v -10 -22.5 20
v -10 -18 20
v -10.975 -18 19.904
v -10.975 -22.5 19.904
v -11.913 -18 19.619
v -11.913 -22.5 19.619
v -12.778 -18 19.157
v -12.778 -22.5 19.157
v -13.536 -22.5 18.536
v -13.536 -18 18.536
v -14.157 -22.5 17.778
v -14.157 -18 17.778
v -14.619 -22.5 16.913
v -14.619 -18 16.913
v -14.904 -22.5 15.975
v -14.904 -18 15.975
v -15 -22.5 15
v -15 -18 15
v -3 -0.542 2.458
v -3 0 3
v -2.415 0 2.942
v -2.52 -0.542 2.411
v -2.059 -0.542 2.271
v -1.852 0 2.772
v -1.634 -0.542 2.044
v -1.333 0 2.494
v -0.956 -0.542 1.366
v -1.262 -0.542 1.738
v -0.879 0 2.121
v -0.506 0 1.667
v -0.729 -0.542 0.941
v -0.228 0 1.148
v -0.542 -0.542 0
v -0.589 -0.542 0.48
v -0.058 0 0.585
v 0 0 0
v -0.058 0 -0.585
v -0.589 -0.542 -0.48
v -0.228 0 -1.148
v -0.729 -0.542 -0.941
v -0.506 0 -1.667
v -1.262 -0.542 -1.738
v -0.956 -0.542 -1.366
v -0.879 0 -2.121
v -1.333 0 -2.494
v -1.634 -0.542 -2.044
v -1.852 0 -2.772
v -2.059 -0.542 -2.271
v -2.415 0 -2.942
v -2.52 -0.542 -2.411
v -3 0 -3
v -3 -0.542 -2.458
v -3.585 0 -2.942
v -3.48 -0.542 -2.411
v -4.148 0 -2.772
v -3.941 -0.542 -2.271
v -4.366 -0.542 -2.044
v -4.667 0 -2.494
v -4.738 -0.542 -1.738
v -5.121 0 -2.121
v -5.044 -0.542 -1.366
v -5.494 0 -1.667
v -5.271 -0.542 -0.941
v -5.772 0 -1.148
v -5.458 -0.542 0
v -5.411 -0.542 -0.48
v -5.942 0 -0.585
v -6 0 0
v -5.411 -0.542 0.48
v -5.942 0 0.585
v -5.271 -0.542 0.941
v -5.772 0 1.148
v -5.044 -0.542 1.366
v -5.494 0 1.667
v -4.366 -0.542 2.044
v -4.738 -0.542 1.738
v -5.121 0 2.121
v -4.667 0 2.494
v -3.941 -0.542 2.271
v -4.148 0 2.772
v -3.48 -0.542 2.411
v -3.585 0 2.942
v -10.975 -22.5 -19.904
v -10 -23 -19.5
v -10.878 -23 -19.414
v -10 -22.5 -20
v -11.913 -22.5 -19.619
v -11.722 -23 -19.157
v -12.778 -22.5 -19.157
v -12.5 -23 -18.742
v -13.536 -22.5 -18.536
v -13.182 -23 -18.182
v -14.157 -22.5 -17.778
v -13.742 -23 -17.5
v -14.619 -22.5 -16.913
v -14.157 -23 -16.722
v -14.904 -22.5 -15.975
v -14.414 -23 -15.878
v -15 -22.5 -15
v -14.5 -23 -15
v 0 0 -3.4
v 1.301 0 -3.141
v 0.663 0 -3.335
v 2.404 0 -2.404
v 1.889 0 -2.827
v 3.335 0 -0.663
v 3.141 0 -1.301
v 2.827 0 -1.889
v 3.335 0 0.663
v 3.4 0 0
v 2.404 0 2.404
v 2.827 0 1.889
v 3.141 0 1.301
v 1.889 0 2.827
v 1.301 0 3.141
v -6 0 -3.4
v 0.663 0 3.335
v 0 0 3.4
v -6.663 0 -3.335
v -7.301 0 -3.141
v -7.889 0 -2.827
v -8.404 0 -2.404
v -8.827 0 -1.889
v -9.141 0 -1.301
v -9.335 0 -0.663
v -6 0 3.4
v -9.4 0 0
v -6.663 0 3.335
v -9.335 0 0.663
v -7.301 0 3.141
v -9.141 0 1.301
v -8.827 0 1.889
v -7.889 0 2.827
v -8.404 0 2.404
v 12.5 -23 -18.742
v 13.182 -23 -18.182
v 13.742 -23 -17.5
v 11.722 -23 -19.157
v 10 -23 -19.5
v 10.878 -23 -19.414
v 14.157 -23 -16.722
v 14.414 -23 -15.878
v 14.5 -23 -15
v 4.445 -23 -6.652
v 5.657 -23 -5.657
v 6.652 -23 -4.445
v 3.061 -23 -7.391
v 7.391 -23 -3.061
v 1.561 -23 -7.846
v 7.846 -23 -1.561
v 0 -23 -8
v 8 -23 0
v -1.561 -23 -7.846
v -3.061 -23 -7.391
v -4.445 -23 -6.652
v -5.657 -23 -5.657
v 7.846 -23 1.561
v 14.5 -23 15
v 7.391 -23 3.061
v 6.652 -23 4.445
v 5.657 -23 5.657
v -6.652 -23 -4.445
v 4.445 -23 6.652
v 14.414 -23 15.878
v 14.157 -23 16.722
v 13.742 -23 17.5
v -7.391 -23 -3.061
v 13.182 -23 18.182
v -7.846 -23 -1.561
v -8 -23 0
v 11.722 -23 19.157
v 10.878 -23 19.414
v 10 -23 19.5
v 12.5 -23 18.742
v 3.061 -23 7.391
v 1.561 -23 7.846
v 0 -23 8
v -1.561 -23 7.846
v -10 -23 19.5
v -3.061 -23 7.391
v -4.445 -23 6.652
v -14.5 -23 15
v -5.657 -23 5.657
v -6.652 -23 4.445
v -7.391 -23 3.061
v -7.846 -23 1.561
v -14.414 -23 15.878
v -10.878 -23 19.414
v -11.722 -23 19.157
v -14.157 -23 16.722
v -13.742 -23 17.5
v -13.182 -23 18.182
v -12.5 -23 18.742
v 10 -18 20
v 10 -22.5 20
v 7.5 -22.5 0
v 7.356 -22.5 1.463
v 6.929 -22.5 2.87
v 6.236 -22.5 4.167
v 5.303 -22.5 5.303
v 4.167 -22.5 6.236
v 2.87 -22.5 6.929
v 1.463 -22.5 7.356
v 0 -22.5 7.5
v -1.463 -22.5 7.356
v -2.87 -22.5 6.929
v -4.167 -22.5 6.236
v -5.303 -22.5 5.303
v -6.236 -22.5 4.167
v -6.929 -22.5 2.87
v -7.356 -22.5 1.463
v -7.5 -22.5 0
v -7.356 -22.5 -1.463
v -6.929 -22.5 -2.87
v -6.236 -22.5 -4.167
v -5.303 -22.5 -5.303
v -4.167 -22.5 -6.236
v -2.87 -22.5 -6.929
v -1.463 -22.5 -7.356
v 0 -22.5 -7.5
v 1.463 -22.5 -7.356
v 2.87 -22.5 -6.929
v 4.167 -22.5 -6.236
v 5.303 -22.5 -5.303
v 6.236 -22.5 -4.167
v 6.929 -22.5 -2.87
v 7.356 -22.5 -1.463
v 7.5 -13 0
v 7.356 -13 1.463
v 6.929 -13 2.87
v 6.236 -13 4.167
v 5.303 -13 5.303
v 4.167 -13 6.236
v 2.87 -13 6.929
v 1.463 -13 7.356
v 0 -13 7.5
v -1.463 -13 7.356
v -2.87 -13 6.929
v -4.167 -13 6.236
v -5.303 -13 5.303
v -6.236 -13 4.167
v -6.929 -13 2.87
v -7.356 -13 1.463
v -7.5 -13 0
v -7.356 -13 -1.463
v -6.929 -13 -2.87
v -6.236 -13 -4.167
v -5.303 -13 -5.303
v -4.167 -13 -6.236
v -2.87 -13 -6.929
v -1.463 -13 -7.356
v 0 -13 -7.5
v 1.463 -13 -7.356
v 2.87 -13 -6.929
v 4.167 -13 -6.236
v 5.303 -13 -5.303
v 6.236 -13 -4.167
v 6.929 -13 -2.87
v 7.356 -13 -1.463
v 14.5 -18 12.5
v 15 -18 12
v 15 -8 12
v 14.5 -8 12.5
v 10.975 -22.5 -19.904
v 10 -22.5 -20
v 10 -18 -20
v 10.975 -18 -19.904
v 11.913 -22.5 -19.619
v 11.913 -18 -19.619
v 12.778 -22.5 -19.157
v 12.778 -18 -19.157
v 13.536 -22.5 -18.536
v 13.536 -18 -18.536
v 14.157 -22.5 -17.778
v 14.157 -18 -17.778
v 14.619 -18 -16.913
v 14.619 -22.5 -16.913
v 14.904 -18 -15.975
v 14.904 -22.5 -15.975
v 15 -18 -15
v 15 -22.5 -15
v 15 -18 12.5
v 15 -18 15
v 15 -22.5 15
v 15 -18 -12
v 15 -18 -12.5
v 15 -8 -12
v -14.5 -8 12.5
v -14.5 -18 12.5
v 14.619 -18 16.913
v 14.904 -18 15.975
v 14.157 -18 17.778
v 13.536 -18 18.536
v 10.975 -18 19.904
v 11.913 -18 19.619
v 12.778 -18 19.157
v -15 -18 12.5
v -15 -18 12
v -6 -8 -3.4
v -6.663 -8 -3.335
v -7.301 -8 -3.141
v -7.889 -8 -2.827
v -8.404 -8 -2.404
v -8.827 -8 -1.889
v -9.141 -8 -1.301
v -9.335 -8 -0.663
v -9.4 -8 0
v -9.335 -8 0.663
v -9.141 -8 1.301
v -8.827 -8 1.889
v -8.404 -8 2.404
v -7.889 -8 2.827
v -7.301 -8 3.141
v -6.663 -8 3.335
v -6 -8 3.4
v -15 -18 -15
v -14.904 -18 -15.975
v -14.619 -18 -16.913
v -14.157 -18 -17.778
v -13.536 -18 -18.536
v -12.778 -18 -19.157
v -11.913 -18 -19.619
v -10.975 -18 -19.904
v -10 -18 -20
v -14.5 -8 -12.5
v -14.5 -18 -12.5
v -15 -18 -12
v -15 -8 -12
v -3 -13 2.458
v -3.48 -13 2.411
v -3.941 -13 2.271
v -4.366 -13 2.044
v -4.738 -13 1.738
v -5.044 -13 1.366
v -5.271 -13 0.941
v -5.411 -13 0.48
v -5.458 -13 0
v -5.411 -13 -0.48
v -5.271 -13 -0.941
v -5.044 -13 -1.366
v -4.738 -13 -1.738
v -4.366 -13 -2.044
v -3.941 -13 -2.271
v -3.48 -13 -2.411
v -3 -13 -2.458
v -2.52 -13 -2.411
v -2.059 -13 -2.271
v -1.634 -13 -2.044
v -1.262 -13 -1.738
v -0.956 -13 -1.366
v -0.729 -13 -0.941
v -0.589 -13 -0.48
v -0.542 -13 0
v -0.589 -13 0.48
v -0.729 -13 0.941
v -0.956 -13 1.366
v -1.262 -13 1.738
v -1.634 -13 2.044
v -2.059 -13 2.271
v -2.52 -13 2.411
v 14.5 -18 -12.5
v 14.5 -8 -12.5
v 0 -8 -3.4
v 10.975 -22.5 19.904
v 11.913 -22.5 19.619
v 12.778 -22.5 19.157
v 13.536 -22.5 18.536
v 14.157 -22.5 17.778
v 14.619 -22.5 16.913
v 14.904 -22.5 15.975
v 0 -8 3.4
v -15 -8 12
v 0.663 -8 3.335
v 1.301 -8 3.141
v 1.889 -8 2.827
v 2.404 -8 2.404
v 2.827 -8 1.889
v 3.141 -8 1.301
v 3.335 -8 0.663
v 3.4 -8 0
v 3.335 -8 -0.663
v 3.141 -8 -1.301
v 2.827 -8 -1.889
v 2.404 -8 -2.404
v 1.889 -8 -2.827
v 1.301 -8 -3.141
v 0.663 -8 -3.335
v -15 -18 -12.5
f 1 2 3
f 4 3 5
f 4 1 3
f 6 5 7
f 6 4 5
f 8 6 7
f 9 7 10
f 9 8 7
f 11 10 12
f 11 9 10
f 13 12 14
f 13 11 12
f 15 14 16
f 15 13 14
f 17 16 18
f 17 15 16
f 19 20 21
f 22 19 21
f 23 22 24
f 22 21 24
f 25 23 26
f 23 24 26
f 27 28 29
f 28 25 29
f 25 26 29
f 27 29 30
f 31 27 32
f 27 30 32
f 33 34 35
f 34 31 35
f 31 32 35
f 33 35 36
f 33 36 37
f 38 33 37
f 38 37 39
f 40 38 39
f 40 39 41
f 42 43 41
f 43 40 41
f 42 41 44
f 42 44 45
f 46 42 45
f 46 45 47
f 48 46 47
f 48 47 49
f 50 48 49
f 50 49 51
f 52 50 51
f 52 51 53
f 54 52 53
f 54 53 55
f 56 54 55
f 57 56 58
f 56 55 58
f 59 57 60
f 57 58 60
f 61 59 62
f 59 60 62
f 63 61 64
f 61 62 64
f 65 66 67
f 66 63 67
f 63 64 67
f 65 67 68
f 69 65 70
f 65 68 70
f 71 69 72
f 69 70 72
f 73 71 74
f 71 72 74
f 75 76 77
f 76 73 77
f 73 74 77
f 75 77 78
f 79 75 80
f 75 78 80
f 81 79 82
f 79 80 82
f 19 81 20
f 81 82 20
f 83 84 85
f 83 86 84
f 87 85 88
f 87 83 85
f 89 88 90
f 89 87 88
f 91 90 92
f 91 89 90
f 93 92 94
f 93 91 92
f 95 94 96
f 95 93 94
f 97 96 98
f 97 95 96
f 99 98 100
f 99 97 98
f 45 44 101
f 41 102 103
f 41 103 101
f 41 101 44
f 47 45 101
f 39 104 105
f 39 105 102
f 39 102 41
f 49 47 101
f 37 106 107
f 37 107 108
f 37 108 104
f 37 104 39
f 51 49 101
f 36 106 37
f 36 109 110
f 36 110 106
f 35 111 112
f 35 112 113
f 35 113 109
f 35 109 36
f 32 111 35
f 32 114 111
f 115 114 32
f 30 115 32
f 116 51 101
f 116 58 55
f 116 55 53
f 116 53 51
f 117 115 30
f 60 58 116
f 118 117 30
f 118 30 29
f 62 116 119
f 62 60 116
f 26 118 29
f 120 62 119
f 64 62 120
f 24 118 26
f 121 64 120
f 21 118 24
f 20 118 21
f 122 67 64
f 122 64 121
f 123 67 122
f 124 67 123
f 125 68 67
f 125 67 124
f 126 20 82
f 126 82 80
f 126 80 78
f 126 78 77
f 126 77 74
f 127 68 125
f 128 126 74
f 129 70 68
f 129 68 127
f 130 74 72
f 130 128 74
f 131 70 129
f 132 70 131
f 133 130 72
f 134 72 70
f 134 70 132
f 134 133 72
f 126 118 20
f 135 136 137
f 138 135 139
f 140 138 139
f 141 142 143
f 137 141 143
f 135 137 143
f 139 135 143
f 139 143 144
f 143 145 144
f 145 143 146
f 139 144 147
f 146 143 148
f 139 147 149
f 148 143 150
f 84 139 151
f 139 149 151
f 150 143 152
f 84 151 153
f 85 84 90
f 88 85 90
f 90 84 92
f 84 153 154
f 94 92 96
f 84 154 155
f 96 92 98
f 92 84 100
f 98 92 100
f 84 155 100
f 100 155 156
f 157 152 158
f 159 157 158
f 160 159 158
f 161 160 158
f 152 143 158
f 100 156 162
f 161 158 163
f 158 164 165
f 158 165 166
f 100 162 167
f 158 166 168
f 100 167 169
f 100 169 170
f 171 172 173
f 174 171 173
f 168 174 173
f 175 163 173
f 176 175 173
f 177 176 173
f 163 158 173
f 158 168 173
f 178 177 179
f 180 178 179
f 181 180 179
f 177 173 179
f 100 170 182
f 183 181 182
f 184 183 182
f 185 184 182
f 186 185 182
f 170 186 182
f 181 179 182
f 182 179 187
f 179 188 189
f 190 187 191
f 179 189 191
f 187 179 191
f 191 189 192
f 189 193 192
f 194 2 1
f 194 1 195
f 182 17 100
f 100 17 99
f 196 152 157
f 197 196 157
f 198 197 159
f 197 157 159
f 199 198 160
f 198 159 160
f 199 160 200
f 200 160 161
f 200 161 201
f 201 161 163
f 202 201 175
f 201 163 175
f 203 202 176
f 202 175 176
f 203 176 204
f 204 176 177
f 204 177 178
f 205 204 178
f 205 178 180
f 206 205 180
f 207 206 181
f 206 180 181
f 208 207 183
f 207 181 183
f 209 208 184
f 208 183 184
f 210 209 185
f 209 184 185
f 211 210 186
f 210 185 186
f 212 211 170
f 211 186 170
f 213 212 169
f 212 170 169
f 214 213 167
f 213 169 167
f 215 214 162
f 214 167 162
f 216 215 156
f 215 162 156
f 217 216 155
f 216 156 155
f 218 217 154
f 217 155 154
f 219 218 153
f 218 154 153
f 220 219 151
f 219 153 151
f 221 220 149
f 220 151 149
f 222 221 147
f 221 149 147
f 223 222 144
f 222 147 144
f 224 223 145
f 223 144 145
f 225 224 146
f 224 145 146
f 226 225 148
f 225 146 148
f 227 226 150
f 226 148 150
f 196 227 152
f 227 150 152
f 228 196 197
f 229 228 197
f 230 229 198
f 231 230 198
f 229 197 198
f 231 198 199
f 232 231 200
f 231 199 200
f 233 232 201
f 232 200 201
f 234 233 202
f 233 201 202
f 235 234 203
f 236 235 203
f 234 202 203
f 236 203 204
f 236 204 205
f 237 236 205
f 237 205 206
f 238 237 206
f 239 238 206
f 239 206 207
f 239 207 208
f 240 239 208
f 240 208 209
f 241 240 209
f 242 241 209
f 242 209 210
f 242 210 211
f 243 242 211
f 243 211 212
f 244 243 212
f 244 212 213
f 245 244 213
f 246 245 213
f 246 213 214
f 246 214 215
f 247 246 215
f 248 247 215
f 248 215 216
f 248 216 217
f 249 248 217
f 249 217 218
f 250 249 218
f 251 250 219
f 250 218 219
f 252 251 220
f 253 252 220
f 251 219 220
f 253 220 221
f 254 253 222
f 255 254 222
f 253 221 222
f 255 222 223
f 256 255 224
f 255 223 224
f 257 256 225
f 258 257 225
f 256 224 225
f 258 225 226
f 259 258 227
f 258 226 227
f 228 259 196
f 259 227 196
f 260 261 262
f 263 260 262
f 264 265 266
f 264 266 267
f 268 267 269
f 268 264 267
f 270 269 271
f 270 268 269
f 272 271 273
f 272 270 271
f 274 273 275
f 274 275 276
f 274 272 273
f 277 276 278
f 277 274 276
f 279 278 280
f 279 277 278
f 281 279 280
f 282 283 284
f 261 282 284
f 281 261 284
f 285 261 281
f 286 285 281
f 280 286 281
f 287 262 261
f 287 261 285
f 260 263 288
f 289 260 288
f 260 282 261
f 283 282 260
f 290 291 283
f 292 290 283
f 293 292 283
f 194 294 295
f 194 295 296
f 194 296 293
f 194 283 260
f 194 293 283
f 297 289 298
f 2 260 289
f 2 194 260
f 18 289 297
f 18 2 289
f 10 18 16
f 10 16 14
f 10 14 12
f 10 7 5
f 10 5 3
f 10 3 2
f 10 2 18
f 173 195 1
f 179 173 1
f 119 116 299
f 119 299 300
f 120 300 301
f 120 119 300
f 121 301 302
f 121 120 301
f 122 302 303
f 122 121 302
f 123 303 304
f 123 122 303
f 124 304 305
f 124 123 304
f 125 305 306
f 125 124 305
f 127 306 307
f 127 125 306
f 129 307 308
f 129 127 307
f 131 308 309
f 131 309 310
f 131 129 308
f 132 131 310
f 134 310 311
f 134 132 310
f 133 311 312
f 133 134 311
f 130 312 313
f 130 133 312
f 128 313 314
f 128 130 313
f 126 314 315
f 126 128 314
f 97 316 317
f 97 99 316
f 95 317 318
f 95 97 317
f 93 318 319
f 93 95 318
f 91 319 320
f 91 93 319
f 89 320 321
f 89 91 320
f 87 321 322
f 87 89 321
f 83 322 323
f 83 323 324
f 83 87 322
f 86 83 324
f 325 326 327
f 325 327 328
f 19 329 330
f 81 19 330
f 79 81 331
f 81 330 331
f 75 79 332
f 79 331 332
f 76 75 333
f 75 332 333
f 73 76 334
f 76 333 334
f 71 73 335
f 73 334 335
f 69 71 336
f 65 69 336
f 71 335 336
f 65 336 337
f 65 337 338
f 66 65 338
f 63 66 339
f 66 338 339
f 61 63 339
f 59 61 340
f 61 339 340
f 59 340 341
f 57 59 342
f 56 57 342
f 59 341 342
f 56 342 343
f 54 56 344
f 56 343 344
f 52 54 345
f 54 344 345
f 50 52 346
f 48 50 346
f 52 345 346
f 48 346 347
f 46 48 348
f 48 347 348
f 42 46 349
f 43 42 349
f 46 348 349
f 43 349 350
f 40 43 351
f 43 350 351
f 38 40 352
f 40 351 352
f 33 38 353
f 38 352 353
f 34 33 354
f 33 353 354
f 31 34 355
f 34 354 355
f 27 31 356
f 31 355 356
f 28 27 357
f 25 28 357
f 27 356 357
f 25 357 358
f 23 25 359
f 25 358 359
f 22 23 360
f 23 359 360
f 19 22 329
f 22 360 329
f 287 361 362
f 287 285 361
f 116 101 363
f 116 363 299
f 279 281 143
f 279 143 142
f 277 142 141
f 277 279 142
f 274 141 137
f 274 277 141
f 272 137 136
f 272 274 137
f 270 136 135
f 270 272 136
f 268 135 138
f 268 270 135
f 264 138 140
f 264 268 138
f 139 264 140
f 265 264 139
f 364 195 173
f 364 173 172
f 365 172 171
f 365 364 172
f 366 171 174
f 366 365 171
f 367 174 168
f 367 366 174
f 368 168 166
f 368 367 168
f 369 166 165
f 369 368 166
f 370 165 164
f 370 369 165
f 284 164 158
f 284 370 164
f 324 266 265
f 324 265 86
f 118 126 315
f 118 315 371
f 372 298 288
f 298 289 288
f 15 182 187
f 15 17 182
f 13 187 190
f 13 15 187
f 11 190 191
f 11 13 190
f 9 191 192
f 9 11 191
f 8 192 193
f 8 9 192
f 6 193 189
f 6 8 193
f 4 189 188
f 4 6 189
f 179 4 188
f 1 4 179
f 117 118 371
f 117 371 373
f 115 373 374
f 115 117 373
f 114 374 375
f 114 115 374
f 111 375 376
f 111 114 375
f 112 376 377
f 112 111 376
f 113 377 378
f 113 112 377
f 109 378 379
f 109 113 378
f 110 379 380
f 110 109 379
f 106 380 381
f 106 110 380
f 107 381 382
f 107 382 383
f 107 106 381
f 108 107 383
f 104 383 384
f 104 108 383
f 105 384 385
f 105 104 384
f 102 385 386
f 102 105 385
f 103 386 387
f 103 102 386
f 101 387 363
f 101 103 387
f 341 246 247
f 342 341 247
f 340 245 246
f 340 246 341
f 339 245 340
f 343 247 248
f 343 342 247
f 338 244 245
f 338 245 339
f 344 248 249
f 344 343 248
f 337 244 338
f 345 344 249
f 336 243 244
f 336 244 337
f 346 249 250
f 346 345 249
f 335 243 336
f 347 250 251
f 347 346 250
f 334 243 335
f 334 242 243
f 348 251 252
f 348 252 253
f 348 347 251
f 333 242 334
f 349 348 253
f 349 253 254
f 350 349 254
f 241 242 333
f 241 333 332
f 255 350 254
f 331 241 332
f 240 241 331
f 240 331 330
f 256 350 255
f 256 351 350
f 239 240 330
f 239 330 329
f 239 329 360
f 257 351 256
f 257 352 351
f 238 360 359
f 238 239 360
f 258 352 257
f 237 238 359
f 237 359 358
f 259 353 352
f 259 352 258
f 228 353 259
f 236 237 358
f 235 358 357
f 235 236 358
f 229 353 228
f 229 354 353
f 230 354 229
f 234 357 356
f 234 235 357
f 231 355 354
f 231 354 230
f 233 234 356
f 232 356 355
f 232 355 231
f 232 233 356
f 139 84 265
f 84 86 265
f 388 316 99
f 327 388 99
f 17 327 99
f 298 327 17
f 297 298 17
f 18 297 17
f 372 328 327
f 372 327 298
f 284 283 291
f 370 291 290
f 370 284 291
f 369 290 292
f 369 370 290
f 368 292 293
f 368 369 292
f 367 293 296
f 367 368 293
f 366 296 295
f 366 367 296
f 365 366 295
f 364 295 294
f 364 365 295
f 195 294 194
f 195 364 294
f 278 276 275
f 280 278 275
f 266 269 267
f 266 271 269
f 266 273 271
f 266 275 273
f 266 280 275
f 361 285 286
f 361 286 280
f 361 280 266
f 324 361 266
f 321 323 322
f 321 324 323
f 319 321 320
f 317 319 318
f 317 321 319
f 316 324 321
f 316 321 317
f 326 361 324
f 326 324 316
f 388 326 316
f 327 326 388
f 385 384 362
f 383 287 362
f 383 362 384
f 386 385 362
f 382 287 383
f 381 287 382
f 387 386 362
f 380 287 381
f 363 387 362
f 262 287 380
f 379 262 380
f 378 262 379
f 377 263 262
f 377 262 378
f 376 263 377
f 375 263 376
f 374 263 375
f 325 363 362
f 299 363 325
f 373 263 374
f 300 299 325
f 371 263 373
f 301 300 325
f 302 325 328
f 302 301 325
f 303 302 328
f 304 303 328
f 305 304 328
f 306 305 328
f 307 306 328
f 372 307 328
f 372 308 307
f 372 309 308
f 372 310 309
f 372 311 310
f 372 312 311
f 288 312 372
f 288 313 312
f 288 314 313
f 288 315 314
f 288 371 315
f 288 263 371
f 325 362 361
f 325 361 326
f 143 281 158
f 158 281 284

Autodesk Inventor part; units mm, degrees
ref_plane "YZ Plane" through (0, 0, 0) normal (1, 0, 0) x (0, 1, 0)
ref_plane "XZ Plane" through (0, 0, 0) normal (0, 1, 0) x (-1, 0, 0)
ref_plane "XY Plane" through (0, 0, 0) normal (0, 0, 1) x (1, 0, 0)
sketch "Sketch1" plane through (0, 0, 0) normal (0, 1, 0) x (-1, 0, 0)
  line L0 (15, 20) -> (-15, 20)
  line L1 (-15, 20) -> (-15, -20)
  line L2 (-15, -20) -> (15, -20)
  line L3 (15, -20) -> (15, 20)
  line L4 (15, 20) -> (-15, -20) construction
  line L5 (-15, 20) -> (15, -20) construction
  line L6 (21, 0) -> (-21, 0) construction
  line L7 (0, -28) -> (0, 28) construction
  line L8 (6, 0) -> (0, 0) construction
  line L9 (6, 3.4) -> (0, 3.4)
  line L10 (0, -3.4) -> (6, -3.4)
  arc A0 (6, -3.4) -> (6, 3.4) centre (6, 0) ccw
  arc A1 (0, 3.4) -> (0, -3.4) centre (0, 0) ccw
  line L11 (-15, 12.5) -> (15, 12.5)
  line L12 (-15, -12.5) -> (15, -12.5)
  point P0 (0, 0)
  point P1 (3, 0)
  point P2 (3, 0)
  point P3 (15, -12.5)
  dimension "d0" = 40
  dimension "d1" = 30
  dimension "d2" = 6
  dimension "d3" = 6.8
  dimension "d19" = 3
  dimension "d35" = 25
extrude "Extrusion1" add sketch "Sketch1" against normal blind 23 contours L3 L11 L1 L0 | L3 L12 L1 L11 | L3 L2 L1 L12 | A0 L10 A1 L9
extrude "Extrusion2" cut sketch "Sketch1" against normal blind 8
sketch "Sketch3" plane through (0, -23, 0) normal (0, -1, 0) x (1, 0, 0)
  circle A0 centre (0, 0) radius 7.5
  dimension "d29" = 15
extrude "Extrusion5" cut sketch "Sketch3" against normal blind 10
extrude "Extrusion6" cut sketch "Sketch1" against normal blind 18 contours L3 L11 L1 L0 | L3 L2 L1 L12
hole "Hole1" at (-3, 0, 0) direction (0, -1, 0) diameter 4.917 depth 13 countersink diameter 6 countersink angle 90 thread size "M6x1" class "6H" standard "ISO Metric profile"
fillet "Fillet1" radius 5 4 edges at (-15, -20.5, 20) (-15, -20.5, -20) (15, -20.5, -20) (15, -20.5, 20)
chamfer "Chamfer1" distance 0.5 angle 45 13 edges at (0, -23, 20) (-13.5355, -23, 18.5355) (-15, -23, 0) (-13.5355, -23, -18.5355) (0, -23, -20) (13.5355, -23, -18.5355) (15, -23, 0) (13.5355, -23, 18.5355) (-7.5, -23, 0) (-15, -13, 12.5) (-15, -13, -12.5) (15, -13, -12.5) (15, -13, 12.5)
equation "\"d4\" = slotTabH + sheetT"
equation "\"d6\" = slotTabH"
equation "\"slotTabH\" = 8"
equation "\"sheetT\" = 15"
equation "\"totalHeight\" = slotTabH + sheetT"
properties part number "TCSM1-X-003" material "Steel"
